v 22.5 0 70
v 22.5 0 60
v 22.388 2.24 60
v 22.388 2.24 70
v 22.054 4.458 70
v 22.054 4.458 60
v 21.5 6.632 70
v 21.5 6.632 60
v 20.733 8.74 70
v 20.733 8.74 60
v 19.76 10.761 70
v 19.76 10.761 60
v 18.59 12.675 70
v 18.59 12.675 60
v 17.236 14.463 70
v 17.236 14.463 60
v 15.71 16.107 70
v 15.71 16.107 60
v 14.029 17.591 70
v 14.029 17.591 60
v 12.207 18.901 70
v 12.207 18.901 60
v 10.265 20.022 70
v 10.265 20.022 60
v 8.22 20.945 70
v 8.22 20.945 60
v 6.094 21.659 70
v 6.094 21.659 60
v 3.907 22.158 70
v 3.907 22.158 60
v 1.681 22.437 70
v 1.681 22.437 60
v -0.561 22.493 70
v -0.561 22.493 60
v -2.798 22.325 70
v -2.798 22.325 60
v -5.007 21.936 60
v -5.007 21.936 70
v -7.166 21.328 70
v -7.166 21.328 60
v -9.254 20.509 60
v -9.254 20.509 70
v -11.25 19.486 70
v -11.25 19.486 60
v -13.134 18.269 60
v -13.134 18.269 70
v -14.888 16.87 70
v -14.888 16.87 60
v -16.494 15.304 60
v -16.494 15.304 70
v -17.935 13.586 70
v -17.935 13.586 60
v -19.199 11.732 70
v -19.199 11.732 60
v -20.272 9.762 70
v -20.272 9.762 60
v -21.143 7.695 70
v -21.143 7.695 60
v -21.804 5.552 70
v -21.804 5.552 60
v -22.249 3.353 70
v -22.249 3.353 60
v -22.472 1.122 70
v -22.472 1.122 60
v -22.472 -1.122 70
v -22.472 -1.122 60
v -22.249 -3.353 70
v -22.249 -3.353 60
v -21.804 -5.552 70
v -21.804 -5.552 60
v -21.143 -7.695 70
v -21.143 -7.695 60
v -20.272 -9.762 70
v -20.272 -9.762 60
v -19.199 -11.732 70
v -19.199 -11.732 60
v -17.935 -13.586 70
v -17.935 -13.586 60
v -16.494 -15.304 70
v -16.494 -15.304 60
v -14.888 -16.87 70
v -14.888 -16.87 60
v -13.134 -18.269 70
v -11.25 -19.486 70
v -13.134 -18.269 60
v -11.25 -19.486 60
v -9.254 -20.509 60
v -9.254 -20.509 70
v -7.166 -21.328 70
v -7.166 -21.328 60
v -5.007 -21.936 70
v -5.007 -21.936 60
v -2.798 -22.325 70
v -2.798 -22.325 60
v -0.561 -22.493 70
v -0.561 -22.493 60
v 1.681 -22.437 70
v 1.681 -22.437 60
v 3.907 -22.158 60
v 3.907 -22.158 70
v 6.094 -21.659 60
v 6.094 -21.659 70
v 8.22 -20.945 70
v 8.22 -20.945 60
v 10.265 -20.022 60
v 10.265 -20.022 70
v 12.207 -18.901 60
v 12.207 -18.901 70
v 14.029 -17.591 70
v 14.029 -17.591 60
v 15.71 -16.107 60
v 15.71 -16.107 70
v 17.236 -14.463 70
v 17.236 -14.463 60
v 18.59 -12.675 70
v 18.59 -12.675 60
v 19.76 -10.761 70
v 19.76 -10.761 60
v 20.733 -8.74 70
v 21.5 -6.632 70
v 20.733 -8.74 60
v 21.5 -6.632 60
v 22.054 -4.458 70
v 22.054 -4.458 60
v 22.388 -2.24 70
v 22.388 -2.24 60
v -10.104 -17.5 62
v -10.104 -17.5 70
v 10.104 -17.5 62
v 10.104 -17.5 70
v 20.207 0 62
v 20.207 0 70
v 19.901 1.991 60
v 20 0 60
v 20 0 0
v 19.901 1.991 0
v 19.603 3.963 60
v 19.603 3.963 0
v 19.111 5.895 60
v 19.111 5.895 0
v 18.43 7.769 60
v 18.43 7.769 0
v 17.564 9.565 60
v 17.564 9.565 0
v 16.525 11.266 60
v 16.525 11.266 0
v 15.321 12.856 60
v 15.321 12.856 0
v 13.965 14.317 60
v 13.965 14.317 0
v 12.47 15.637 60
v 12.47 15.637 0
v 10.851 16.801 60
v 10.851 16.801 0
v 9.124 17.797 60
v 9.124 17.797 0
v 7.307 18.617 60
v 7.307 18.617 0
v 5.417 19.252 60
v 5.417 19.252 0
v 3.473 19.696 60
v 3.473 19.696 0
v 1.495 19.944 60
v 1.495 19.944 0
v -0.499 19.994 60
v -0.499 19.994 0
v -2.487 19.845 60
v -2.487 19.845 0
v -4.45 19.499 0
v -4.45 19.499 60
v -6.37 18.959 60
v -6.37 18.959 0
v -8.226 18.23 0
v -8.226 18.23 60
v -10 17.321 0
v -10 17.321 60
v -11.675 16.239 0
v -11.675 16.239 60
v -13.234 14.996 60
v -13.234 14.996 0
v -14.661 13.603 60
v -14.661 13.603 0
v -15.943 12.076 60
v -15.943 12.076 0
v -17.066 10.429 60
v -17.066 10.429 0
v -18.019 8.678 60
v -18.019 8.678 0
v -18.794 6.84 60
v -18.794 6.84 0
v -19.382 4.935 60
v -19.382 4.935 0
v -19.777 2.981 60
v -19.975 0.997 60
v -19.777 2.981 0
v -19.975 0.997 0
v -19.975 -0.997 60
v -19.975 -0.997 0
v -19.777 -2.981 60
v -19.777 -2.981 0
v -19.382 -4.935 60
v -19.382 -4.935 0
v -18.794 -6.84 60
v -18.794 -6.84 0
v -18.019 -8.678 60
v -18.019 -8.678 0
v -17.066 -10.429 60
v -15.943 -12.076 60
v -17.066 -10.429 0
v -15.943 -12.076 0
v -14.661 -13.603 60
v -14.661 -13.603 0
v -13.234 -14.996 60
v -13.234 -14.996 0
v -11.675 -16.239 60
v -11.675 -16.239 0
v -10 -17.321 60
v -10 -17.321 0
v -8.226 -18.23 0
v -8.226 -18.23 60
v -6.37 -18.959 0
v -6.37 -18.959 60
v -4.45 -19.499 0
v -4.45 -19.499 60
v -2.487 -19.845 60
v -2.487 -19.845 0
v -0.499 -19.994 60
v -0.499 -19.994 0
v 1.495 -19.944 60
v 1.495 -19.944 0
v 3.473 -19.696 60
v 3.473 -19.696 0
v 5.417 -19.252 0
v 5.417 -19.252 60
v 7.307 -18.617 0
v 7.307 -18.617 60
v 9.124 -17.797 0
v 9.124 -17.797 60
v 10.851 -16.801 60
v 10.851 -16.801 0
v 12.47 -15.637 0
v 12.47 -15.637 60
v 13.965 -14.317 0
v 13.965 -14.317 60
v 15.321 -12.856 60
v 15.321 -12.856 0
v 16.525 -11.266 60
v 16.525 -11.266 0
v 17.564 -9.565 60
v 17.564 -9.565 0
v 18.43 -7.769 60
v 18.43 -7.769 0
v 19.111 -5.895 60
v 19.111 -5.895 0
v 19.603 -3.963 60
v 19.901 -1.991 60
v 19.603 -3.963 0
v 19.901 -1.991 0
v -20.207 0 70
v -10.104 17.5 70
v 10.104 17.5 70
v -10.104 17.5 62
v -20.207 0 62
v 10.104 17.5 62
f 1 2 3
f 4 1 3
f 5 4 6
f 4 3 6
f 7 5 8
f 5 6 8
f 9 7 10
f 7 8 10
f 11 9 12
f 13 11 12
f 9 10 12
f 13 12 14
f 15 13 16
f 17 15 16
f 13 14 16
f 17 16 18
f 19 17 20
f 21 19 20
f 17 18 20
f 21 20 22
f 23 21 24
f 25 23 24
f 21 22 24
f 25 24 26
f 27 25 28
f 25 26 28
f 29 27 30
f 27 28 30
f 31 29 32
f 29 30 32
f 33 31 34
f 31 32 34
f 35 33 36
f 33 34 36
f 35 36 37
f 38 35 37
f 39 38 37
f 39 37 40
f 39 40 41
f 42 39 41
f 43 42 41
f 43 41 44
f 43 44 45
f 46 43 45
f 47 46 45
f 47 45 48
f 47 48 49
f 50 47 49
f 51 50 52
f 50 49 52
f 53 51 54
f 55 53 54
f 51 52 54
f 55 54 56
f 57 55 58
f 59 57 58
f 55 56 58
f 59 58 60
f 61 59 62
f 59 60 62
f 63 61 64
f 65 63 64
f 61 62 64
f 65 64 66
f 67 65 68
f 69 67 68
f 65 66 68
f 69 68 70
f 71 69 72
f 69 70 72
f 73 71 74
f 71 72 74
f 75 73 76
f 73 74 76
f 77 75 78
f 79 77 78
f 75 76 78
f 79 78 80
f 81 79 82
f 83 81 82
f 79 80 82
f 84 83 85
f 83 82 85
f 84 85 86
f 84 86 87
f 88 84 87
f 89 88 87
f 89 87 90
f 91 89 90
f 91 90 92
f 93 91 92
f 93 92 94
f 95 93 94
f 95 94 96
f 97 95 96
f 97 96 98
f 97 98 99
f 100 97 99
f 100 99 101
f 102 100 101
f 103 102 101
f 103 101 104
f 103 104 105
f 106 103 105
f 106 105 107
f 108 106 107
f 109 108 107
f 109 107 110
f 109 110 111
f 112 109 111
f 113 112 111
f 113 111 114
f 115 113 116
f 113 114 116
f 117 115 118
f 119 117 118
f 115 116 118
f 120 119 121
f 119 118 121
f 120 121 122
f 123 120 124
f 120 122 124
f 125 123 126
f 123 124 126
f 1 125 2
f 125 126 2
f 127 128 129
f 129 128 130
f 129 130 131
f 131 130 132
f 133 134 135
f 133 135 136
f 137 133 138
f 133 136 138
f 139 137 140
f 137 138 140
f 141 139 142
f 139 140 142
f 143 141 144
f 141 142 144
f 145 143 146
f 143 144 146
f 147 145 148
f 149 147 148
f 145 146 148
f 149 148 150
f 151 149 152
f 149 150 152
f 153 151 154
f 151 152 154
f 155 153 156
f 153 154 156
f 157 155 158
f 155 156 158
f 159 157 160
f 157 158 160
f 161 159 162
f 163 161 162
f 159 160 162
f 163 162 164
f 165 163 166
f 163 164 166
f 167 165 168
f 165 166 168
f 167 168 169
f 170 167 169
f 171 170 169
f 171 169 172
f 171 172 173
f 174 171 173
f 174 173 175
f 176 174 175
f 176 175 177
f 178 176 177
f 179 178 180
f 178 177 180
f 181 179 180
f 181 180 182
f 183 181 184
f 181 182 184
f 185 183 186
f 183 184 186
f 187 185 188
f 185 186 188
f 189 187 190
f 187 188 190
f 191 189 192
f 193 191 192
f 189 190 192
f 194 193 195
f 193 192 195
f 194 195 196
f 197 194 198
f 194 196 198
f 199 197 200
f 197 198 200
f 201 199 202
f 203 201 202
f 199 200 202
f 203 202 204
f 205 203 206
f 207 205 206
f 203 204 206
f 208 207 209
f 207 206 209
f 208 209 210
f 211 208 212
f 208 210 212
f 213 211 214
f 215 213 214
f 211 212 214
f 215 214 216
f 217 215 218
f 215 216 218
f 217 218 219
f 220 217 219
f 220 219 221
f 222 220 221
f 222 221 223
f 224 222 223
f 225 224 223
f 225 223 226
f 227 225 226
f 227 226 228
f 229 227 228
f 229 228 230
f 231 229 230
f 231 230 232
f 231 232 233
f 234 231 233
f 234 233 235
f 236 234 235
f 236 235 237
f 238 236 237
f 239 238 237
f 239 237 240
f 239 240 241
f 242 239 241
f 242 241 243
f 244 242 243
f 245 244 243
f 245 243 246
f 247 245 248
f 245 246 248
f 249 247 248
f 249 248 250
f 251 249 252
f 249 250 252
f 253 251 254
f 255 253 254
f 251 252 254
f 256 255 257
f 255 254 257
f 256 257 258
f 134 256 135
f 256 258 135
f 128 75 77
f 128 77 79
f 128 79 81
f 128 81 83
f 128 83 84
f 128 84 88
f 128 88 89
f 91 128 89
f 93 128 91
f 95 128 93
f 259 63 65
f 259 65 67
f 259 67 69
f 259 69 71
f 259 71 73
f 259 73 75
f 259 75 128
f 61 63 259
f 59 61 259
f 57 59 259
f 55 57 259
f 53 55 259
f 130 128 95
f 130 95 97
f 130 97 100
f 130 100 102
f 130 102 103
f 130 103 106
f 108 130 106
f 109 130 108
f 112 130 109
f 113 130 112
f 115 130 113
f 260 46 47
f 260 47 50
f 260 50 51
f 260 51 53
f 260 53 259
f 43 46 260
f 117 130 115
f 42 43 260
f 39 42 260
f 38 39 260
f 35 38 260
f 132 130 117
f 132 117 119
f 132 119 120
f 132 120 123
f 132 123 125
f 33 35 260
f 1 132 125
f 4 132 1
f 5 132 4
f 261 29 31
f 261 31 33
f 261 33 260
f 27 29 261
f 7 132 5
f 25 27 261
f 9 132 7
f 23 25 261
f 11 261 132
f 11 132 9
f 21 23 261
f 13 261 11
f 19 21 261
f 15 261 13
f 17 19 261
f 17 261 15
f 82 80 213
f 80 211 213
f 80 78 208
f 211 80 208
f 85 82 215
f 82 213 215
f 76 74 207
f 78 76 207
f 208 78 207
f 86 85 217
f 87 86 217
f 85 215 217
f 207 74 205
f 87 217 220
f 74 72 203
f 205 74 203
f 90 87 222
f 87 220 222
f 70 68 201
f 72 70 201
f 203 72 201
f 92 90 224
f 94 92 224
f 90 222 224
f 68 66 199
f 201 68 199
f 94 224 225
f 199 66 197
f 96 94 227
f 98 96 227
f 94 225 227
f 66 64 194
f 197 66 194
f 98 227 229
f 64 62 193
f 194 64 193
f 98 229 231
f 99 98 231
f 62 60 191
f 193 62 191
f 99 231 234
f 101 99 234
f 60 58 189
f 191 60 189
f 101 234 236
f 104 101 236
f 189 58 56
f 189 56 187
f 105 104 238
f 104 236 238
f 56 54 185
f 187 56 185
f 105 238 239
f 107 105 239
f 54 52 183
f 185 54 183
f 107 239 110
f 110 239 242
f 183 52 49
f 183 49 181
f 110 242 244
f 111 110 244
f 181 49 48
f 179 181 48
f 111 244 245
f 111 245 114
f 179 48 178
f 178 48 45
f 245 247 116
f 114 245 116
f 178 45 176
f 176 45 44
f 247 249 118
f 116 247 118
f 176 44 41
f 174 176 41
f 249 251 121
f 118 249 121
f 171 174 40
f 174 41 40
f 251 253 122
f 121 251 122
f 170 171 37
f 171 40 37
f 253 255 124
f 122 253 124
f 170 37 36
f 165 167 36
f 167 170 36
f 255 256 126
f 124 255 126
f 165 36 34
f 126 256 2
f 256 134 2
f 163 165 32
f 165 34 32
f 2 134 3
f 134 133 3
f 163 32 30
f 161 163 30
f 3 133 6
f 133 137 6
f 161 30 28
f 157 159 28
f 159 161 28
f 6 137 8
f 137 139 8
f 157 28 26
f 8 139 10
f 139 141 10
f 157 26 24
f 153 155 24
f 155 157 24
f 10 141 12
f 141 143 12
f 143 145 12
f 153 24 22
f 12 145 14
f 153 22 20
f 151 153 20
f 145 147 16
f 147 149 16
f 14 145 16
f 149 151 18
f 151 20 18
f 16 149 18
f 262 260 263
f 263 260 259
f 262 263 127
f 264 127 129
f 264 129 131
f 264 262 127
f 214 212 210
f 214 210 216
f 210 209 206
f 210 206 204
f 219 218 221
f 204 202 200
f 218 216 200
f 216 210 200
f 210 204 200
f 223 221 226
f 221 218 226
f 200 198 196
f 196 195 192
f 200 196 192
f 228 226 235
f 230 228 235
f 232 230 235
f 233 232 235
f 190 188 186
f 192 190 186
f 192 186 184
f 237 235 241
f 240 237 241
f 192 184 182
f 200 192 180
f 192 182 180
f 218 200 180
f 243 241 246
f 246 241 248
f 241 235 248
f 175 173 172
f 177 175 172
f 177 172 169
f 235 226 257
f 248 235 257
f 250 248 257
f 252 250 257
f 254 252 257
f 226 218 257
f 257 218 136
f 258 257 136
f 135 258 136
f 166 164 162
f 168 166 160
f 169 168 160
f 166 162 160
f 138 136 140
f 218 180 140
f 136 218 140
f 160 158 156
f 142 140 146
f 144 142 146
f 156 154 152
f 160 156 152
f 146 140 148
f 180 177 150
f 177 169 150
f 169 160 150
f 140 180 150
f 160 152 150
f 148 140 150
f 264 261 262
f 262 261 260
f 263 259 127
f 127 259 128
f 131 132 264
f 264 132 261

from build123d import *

# Parameters (mm, degrees)
SKETCH1_R           = 20
BOSS_EXTRUDE1_DEPTH = 60
SKETCH2_R           = 22.5
BOSS_EXTRUDE2_DEPTH = 10
CUT_EXTRUDE1_DEPTH  = 8


with BuildPart() as part:
    # Sketch1 → Boss-Extrude1 (new body)
    with BuildSketch(Plane.XY):
        Circle(SKETCH1_R)
    extrude(amount=BOSS_EXTRUDE1_DEPTH)

    # Sketch2 → Boss-Extrude2 (add)
    with BuildSketch(Plane.XY.offset(60)):
        Circle(SKETCH2_R)
    extrude(amount=BOSS_EXTRUDE2_DEPTH)

    # Sketch3 → Cut-Extrude1 (cut)
    with BuildSketch(Plane.XY.offset(70)):
        Polygon((-20.207259422, 0), (-10.103629711, -17.5), (10.103629711, -17.5), (20.207259422, 0), (10.103629711, 17.5), (-10.103629711, 17.5), align=None)
    extrude(amount=-CUT_EXTRUDE1_DEPTH, mode=Mode.SUBTRACT)


solid = part.part
